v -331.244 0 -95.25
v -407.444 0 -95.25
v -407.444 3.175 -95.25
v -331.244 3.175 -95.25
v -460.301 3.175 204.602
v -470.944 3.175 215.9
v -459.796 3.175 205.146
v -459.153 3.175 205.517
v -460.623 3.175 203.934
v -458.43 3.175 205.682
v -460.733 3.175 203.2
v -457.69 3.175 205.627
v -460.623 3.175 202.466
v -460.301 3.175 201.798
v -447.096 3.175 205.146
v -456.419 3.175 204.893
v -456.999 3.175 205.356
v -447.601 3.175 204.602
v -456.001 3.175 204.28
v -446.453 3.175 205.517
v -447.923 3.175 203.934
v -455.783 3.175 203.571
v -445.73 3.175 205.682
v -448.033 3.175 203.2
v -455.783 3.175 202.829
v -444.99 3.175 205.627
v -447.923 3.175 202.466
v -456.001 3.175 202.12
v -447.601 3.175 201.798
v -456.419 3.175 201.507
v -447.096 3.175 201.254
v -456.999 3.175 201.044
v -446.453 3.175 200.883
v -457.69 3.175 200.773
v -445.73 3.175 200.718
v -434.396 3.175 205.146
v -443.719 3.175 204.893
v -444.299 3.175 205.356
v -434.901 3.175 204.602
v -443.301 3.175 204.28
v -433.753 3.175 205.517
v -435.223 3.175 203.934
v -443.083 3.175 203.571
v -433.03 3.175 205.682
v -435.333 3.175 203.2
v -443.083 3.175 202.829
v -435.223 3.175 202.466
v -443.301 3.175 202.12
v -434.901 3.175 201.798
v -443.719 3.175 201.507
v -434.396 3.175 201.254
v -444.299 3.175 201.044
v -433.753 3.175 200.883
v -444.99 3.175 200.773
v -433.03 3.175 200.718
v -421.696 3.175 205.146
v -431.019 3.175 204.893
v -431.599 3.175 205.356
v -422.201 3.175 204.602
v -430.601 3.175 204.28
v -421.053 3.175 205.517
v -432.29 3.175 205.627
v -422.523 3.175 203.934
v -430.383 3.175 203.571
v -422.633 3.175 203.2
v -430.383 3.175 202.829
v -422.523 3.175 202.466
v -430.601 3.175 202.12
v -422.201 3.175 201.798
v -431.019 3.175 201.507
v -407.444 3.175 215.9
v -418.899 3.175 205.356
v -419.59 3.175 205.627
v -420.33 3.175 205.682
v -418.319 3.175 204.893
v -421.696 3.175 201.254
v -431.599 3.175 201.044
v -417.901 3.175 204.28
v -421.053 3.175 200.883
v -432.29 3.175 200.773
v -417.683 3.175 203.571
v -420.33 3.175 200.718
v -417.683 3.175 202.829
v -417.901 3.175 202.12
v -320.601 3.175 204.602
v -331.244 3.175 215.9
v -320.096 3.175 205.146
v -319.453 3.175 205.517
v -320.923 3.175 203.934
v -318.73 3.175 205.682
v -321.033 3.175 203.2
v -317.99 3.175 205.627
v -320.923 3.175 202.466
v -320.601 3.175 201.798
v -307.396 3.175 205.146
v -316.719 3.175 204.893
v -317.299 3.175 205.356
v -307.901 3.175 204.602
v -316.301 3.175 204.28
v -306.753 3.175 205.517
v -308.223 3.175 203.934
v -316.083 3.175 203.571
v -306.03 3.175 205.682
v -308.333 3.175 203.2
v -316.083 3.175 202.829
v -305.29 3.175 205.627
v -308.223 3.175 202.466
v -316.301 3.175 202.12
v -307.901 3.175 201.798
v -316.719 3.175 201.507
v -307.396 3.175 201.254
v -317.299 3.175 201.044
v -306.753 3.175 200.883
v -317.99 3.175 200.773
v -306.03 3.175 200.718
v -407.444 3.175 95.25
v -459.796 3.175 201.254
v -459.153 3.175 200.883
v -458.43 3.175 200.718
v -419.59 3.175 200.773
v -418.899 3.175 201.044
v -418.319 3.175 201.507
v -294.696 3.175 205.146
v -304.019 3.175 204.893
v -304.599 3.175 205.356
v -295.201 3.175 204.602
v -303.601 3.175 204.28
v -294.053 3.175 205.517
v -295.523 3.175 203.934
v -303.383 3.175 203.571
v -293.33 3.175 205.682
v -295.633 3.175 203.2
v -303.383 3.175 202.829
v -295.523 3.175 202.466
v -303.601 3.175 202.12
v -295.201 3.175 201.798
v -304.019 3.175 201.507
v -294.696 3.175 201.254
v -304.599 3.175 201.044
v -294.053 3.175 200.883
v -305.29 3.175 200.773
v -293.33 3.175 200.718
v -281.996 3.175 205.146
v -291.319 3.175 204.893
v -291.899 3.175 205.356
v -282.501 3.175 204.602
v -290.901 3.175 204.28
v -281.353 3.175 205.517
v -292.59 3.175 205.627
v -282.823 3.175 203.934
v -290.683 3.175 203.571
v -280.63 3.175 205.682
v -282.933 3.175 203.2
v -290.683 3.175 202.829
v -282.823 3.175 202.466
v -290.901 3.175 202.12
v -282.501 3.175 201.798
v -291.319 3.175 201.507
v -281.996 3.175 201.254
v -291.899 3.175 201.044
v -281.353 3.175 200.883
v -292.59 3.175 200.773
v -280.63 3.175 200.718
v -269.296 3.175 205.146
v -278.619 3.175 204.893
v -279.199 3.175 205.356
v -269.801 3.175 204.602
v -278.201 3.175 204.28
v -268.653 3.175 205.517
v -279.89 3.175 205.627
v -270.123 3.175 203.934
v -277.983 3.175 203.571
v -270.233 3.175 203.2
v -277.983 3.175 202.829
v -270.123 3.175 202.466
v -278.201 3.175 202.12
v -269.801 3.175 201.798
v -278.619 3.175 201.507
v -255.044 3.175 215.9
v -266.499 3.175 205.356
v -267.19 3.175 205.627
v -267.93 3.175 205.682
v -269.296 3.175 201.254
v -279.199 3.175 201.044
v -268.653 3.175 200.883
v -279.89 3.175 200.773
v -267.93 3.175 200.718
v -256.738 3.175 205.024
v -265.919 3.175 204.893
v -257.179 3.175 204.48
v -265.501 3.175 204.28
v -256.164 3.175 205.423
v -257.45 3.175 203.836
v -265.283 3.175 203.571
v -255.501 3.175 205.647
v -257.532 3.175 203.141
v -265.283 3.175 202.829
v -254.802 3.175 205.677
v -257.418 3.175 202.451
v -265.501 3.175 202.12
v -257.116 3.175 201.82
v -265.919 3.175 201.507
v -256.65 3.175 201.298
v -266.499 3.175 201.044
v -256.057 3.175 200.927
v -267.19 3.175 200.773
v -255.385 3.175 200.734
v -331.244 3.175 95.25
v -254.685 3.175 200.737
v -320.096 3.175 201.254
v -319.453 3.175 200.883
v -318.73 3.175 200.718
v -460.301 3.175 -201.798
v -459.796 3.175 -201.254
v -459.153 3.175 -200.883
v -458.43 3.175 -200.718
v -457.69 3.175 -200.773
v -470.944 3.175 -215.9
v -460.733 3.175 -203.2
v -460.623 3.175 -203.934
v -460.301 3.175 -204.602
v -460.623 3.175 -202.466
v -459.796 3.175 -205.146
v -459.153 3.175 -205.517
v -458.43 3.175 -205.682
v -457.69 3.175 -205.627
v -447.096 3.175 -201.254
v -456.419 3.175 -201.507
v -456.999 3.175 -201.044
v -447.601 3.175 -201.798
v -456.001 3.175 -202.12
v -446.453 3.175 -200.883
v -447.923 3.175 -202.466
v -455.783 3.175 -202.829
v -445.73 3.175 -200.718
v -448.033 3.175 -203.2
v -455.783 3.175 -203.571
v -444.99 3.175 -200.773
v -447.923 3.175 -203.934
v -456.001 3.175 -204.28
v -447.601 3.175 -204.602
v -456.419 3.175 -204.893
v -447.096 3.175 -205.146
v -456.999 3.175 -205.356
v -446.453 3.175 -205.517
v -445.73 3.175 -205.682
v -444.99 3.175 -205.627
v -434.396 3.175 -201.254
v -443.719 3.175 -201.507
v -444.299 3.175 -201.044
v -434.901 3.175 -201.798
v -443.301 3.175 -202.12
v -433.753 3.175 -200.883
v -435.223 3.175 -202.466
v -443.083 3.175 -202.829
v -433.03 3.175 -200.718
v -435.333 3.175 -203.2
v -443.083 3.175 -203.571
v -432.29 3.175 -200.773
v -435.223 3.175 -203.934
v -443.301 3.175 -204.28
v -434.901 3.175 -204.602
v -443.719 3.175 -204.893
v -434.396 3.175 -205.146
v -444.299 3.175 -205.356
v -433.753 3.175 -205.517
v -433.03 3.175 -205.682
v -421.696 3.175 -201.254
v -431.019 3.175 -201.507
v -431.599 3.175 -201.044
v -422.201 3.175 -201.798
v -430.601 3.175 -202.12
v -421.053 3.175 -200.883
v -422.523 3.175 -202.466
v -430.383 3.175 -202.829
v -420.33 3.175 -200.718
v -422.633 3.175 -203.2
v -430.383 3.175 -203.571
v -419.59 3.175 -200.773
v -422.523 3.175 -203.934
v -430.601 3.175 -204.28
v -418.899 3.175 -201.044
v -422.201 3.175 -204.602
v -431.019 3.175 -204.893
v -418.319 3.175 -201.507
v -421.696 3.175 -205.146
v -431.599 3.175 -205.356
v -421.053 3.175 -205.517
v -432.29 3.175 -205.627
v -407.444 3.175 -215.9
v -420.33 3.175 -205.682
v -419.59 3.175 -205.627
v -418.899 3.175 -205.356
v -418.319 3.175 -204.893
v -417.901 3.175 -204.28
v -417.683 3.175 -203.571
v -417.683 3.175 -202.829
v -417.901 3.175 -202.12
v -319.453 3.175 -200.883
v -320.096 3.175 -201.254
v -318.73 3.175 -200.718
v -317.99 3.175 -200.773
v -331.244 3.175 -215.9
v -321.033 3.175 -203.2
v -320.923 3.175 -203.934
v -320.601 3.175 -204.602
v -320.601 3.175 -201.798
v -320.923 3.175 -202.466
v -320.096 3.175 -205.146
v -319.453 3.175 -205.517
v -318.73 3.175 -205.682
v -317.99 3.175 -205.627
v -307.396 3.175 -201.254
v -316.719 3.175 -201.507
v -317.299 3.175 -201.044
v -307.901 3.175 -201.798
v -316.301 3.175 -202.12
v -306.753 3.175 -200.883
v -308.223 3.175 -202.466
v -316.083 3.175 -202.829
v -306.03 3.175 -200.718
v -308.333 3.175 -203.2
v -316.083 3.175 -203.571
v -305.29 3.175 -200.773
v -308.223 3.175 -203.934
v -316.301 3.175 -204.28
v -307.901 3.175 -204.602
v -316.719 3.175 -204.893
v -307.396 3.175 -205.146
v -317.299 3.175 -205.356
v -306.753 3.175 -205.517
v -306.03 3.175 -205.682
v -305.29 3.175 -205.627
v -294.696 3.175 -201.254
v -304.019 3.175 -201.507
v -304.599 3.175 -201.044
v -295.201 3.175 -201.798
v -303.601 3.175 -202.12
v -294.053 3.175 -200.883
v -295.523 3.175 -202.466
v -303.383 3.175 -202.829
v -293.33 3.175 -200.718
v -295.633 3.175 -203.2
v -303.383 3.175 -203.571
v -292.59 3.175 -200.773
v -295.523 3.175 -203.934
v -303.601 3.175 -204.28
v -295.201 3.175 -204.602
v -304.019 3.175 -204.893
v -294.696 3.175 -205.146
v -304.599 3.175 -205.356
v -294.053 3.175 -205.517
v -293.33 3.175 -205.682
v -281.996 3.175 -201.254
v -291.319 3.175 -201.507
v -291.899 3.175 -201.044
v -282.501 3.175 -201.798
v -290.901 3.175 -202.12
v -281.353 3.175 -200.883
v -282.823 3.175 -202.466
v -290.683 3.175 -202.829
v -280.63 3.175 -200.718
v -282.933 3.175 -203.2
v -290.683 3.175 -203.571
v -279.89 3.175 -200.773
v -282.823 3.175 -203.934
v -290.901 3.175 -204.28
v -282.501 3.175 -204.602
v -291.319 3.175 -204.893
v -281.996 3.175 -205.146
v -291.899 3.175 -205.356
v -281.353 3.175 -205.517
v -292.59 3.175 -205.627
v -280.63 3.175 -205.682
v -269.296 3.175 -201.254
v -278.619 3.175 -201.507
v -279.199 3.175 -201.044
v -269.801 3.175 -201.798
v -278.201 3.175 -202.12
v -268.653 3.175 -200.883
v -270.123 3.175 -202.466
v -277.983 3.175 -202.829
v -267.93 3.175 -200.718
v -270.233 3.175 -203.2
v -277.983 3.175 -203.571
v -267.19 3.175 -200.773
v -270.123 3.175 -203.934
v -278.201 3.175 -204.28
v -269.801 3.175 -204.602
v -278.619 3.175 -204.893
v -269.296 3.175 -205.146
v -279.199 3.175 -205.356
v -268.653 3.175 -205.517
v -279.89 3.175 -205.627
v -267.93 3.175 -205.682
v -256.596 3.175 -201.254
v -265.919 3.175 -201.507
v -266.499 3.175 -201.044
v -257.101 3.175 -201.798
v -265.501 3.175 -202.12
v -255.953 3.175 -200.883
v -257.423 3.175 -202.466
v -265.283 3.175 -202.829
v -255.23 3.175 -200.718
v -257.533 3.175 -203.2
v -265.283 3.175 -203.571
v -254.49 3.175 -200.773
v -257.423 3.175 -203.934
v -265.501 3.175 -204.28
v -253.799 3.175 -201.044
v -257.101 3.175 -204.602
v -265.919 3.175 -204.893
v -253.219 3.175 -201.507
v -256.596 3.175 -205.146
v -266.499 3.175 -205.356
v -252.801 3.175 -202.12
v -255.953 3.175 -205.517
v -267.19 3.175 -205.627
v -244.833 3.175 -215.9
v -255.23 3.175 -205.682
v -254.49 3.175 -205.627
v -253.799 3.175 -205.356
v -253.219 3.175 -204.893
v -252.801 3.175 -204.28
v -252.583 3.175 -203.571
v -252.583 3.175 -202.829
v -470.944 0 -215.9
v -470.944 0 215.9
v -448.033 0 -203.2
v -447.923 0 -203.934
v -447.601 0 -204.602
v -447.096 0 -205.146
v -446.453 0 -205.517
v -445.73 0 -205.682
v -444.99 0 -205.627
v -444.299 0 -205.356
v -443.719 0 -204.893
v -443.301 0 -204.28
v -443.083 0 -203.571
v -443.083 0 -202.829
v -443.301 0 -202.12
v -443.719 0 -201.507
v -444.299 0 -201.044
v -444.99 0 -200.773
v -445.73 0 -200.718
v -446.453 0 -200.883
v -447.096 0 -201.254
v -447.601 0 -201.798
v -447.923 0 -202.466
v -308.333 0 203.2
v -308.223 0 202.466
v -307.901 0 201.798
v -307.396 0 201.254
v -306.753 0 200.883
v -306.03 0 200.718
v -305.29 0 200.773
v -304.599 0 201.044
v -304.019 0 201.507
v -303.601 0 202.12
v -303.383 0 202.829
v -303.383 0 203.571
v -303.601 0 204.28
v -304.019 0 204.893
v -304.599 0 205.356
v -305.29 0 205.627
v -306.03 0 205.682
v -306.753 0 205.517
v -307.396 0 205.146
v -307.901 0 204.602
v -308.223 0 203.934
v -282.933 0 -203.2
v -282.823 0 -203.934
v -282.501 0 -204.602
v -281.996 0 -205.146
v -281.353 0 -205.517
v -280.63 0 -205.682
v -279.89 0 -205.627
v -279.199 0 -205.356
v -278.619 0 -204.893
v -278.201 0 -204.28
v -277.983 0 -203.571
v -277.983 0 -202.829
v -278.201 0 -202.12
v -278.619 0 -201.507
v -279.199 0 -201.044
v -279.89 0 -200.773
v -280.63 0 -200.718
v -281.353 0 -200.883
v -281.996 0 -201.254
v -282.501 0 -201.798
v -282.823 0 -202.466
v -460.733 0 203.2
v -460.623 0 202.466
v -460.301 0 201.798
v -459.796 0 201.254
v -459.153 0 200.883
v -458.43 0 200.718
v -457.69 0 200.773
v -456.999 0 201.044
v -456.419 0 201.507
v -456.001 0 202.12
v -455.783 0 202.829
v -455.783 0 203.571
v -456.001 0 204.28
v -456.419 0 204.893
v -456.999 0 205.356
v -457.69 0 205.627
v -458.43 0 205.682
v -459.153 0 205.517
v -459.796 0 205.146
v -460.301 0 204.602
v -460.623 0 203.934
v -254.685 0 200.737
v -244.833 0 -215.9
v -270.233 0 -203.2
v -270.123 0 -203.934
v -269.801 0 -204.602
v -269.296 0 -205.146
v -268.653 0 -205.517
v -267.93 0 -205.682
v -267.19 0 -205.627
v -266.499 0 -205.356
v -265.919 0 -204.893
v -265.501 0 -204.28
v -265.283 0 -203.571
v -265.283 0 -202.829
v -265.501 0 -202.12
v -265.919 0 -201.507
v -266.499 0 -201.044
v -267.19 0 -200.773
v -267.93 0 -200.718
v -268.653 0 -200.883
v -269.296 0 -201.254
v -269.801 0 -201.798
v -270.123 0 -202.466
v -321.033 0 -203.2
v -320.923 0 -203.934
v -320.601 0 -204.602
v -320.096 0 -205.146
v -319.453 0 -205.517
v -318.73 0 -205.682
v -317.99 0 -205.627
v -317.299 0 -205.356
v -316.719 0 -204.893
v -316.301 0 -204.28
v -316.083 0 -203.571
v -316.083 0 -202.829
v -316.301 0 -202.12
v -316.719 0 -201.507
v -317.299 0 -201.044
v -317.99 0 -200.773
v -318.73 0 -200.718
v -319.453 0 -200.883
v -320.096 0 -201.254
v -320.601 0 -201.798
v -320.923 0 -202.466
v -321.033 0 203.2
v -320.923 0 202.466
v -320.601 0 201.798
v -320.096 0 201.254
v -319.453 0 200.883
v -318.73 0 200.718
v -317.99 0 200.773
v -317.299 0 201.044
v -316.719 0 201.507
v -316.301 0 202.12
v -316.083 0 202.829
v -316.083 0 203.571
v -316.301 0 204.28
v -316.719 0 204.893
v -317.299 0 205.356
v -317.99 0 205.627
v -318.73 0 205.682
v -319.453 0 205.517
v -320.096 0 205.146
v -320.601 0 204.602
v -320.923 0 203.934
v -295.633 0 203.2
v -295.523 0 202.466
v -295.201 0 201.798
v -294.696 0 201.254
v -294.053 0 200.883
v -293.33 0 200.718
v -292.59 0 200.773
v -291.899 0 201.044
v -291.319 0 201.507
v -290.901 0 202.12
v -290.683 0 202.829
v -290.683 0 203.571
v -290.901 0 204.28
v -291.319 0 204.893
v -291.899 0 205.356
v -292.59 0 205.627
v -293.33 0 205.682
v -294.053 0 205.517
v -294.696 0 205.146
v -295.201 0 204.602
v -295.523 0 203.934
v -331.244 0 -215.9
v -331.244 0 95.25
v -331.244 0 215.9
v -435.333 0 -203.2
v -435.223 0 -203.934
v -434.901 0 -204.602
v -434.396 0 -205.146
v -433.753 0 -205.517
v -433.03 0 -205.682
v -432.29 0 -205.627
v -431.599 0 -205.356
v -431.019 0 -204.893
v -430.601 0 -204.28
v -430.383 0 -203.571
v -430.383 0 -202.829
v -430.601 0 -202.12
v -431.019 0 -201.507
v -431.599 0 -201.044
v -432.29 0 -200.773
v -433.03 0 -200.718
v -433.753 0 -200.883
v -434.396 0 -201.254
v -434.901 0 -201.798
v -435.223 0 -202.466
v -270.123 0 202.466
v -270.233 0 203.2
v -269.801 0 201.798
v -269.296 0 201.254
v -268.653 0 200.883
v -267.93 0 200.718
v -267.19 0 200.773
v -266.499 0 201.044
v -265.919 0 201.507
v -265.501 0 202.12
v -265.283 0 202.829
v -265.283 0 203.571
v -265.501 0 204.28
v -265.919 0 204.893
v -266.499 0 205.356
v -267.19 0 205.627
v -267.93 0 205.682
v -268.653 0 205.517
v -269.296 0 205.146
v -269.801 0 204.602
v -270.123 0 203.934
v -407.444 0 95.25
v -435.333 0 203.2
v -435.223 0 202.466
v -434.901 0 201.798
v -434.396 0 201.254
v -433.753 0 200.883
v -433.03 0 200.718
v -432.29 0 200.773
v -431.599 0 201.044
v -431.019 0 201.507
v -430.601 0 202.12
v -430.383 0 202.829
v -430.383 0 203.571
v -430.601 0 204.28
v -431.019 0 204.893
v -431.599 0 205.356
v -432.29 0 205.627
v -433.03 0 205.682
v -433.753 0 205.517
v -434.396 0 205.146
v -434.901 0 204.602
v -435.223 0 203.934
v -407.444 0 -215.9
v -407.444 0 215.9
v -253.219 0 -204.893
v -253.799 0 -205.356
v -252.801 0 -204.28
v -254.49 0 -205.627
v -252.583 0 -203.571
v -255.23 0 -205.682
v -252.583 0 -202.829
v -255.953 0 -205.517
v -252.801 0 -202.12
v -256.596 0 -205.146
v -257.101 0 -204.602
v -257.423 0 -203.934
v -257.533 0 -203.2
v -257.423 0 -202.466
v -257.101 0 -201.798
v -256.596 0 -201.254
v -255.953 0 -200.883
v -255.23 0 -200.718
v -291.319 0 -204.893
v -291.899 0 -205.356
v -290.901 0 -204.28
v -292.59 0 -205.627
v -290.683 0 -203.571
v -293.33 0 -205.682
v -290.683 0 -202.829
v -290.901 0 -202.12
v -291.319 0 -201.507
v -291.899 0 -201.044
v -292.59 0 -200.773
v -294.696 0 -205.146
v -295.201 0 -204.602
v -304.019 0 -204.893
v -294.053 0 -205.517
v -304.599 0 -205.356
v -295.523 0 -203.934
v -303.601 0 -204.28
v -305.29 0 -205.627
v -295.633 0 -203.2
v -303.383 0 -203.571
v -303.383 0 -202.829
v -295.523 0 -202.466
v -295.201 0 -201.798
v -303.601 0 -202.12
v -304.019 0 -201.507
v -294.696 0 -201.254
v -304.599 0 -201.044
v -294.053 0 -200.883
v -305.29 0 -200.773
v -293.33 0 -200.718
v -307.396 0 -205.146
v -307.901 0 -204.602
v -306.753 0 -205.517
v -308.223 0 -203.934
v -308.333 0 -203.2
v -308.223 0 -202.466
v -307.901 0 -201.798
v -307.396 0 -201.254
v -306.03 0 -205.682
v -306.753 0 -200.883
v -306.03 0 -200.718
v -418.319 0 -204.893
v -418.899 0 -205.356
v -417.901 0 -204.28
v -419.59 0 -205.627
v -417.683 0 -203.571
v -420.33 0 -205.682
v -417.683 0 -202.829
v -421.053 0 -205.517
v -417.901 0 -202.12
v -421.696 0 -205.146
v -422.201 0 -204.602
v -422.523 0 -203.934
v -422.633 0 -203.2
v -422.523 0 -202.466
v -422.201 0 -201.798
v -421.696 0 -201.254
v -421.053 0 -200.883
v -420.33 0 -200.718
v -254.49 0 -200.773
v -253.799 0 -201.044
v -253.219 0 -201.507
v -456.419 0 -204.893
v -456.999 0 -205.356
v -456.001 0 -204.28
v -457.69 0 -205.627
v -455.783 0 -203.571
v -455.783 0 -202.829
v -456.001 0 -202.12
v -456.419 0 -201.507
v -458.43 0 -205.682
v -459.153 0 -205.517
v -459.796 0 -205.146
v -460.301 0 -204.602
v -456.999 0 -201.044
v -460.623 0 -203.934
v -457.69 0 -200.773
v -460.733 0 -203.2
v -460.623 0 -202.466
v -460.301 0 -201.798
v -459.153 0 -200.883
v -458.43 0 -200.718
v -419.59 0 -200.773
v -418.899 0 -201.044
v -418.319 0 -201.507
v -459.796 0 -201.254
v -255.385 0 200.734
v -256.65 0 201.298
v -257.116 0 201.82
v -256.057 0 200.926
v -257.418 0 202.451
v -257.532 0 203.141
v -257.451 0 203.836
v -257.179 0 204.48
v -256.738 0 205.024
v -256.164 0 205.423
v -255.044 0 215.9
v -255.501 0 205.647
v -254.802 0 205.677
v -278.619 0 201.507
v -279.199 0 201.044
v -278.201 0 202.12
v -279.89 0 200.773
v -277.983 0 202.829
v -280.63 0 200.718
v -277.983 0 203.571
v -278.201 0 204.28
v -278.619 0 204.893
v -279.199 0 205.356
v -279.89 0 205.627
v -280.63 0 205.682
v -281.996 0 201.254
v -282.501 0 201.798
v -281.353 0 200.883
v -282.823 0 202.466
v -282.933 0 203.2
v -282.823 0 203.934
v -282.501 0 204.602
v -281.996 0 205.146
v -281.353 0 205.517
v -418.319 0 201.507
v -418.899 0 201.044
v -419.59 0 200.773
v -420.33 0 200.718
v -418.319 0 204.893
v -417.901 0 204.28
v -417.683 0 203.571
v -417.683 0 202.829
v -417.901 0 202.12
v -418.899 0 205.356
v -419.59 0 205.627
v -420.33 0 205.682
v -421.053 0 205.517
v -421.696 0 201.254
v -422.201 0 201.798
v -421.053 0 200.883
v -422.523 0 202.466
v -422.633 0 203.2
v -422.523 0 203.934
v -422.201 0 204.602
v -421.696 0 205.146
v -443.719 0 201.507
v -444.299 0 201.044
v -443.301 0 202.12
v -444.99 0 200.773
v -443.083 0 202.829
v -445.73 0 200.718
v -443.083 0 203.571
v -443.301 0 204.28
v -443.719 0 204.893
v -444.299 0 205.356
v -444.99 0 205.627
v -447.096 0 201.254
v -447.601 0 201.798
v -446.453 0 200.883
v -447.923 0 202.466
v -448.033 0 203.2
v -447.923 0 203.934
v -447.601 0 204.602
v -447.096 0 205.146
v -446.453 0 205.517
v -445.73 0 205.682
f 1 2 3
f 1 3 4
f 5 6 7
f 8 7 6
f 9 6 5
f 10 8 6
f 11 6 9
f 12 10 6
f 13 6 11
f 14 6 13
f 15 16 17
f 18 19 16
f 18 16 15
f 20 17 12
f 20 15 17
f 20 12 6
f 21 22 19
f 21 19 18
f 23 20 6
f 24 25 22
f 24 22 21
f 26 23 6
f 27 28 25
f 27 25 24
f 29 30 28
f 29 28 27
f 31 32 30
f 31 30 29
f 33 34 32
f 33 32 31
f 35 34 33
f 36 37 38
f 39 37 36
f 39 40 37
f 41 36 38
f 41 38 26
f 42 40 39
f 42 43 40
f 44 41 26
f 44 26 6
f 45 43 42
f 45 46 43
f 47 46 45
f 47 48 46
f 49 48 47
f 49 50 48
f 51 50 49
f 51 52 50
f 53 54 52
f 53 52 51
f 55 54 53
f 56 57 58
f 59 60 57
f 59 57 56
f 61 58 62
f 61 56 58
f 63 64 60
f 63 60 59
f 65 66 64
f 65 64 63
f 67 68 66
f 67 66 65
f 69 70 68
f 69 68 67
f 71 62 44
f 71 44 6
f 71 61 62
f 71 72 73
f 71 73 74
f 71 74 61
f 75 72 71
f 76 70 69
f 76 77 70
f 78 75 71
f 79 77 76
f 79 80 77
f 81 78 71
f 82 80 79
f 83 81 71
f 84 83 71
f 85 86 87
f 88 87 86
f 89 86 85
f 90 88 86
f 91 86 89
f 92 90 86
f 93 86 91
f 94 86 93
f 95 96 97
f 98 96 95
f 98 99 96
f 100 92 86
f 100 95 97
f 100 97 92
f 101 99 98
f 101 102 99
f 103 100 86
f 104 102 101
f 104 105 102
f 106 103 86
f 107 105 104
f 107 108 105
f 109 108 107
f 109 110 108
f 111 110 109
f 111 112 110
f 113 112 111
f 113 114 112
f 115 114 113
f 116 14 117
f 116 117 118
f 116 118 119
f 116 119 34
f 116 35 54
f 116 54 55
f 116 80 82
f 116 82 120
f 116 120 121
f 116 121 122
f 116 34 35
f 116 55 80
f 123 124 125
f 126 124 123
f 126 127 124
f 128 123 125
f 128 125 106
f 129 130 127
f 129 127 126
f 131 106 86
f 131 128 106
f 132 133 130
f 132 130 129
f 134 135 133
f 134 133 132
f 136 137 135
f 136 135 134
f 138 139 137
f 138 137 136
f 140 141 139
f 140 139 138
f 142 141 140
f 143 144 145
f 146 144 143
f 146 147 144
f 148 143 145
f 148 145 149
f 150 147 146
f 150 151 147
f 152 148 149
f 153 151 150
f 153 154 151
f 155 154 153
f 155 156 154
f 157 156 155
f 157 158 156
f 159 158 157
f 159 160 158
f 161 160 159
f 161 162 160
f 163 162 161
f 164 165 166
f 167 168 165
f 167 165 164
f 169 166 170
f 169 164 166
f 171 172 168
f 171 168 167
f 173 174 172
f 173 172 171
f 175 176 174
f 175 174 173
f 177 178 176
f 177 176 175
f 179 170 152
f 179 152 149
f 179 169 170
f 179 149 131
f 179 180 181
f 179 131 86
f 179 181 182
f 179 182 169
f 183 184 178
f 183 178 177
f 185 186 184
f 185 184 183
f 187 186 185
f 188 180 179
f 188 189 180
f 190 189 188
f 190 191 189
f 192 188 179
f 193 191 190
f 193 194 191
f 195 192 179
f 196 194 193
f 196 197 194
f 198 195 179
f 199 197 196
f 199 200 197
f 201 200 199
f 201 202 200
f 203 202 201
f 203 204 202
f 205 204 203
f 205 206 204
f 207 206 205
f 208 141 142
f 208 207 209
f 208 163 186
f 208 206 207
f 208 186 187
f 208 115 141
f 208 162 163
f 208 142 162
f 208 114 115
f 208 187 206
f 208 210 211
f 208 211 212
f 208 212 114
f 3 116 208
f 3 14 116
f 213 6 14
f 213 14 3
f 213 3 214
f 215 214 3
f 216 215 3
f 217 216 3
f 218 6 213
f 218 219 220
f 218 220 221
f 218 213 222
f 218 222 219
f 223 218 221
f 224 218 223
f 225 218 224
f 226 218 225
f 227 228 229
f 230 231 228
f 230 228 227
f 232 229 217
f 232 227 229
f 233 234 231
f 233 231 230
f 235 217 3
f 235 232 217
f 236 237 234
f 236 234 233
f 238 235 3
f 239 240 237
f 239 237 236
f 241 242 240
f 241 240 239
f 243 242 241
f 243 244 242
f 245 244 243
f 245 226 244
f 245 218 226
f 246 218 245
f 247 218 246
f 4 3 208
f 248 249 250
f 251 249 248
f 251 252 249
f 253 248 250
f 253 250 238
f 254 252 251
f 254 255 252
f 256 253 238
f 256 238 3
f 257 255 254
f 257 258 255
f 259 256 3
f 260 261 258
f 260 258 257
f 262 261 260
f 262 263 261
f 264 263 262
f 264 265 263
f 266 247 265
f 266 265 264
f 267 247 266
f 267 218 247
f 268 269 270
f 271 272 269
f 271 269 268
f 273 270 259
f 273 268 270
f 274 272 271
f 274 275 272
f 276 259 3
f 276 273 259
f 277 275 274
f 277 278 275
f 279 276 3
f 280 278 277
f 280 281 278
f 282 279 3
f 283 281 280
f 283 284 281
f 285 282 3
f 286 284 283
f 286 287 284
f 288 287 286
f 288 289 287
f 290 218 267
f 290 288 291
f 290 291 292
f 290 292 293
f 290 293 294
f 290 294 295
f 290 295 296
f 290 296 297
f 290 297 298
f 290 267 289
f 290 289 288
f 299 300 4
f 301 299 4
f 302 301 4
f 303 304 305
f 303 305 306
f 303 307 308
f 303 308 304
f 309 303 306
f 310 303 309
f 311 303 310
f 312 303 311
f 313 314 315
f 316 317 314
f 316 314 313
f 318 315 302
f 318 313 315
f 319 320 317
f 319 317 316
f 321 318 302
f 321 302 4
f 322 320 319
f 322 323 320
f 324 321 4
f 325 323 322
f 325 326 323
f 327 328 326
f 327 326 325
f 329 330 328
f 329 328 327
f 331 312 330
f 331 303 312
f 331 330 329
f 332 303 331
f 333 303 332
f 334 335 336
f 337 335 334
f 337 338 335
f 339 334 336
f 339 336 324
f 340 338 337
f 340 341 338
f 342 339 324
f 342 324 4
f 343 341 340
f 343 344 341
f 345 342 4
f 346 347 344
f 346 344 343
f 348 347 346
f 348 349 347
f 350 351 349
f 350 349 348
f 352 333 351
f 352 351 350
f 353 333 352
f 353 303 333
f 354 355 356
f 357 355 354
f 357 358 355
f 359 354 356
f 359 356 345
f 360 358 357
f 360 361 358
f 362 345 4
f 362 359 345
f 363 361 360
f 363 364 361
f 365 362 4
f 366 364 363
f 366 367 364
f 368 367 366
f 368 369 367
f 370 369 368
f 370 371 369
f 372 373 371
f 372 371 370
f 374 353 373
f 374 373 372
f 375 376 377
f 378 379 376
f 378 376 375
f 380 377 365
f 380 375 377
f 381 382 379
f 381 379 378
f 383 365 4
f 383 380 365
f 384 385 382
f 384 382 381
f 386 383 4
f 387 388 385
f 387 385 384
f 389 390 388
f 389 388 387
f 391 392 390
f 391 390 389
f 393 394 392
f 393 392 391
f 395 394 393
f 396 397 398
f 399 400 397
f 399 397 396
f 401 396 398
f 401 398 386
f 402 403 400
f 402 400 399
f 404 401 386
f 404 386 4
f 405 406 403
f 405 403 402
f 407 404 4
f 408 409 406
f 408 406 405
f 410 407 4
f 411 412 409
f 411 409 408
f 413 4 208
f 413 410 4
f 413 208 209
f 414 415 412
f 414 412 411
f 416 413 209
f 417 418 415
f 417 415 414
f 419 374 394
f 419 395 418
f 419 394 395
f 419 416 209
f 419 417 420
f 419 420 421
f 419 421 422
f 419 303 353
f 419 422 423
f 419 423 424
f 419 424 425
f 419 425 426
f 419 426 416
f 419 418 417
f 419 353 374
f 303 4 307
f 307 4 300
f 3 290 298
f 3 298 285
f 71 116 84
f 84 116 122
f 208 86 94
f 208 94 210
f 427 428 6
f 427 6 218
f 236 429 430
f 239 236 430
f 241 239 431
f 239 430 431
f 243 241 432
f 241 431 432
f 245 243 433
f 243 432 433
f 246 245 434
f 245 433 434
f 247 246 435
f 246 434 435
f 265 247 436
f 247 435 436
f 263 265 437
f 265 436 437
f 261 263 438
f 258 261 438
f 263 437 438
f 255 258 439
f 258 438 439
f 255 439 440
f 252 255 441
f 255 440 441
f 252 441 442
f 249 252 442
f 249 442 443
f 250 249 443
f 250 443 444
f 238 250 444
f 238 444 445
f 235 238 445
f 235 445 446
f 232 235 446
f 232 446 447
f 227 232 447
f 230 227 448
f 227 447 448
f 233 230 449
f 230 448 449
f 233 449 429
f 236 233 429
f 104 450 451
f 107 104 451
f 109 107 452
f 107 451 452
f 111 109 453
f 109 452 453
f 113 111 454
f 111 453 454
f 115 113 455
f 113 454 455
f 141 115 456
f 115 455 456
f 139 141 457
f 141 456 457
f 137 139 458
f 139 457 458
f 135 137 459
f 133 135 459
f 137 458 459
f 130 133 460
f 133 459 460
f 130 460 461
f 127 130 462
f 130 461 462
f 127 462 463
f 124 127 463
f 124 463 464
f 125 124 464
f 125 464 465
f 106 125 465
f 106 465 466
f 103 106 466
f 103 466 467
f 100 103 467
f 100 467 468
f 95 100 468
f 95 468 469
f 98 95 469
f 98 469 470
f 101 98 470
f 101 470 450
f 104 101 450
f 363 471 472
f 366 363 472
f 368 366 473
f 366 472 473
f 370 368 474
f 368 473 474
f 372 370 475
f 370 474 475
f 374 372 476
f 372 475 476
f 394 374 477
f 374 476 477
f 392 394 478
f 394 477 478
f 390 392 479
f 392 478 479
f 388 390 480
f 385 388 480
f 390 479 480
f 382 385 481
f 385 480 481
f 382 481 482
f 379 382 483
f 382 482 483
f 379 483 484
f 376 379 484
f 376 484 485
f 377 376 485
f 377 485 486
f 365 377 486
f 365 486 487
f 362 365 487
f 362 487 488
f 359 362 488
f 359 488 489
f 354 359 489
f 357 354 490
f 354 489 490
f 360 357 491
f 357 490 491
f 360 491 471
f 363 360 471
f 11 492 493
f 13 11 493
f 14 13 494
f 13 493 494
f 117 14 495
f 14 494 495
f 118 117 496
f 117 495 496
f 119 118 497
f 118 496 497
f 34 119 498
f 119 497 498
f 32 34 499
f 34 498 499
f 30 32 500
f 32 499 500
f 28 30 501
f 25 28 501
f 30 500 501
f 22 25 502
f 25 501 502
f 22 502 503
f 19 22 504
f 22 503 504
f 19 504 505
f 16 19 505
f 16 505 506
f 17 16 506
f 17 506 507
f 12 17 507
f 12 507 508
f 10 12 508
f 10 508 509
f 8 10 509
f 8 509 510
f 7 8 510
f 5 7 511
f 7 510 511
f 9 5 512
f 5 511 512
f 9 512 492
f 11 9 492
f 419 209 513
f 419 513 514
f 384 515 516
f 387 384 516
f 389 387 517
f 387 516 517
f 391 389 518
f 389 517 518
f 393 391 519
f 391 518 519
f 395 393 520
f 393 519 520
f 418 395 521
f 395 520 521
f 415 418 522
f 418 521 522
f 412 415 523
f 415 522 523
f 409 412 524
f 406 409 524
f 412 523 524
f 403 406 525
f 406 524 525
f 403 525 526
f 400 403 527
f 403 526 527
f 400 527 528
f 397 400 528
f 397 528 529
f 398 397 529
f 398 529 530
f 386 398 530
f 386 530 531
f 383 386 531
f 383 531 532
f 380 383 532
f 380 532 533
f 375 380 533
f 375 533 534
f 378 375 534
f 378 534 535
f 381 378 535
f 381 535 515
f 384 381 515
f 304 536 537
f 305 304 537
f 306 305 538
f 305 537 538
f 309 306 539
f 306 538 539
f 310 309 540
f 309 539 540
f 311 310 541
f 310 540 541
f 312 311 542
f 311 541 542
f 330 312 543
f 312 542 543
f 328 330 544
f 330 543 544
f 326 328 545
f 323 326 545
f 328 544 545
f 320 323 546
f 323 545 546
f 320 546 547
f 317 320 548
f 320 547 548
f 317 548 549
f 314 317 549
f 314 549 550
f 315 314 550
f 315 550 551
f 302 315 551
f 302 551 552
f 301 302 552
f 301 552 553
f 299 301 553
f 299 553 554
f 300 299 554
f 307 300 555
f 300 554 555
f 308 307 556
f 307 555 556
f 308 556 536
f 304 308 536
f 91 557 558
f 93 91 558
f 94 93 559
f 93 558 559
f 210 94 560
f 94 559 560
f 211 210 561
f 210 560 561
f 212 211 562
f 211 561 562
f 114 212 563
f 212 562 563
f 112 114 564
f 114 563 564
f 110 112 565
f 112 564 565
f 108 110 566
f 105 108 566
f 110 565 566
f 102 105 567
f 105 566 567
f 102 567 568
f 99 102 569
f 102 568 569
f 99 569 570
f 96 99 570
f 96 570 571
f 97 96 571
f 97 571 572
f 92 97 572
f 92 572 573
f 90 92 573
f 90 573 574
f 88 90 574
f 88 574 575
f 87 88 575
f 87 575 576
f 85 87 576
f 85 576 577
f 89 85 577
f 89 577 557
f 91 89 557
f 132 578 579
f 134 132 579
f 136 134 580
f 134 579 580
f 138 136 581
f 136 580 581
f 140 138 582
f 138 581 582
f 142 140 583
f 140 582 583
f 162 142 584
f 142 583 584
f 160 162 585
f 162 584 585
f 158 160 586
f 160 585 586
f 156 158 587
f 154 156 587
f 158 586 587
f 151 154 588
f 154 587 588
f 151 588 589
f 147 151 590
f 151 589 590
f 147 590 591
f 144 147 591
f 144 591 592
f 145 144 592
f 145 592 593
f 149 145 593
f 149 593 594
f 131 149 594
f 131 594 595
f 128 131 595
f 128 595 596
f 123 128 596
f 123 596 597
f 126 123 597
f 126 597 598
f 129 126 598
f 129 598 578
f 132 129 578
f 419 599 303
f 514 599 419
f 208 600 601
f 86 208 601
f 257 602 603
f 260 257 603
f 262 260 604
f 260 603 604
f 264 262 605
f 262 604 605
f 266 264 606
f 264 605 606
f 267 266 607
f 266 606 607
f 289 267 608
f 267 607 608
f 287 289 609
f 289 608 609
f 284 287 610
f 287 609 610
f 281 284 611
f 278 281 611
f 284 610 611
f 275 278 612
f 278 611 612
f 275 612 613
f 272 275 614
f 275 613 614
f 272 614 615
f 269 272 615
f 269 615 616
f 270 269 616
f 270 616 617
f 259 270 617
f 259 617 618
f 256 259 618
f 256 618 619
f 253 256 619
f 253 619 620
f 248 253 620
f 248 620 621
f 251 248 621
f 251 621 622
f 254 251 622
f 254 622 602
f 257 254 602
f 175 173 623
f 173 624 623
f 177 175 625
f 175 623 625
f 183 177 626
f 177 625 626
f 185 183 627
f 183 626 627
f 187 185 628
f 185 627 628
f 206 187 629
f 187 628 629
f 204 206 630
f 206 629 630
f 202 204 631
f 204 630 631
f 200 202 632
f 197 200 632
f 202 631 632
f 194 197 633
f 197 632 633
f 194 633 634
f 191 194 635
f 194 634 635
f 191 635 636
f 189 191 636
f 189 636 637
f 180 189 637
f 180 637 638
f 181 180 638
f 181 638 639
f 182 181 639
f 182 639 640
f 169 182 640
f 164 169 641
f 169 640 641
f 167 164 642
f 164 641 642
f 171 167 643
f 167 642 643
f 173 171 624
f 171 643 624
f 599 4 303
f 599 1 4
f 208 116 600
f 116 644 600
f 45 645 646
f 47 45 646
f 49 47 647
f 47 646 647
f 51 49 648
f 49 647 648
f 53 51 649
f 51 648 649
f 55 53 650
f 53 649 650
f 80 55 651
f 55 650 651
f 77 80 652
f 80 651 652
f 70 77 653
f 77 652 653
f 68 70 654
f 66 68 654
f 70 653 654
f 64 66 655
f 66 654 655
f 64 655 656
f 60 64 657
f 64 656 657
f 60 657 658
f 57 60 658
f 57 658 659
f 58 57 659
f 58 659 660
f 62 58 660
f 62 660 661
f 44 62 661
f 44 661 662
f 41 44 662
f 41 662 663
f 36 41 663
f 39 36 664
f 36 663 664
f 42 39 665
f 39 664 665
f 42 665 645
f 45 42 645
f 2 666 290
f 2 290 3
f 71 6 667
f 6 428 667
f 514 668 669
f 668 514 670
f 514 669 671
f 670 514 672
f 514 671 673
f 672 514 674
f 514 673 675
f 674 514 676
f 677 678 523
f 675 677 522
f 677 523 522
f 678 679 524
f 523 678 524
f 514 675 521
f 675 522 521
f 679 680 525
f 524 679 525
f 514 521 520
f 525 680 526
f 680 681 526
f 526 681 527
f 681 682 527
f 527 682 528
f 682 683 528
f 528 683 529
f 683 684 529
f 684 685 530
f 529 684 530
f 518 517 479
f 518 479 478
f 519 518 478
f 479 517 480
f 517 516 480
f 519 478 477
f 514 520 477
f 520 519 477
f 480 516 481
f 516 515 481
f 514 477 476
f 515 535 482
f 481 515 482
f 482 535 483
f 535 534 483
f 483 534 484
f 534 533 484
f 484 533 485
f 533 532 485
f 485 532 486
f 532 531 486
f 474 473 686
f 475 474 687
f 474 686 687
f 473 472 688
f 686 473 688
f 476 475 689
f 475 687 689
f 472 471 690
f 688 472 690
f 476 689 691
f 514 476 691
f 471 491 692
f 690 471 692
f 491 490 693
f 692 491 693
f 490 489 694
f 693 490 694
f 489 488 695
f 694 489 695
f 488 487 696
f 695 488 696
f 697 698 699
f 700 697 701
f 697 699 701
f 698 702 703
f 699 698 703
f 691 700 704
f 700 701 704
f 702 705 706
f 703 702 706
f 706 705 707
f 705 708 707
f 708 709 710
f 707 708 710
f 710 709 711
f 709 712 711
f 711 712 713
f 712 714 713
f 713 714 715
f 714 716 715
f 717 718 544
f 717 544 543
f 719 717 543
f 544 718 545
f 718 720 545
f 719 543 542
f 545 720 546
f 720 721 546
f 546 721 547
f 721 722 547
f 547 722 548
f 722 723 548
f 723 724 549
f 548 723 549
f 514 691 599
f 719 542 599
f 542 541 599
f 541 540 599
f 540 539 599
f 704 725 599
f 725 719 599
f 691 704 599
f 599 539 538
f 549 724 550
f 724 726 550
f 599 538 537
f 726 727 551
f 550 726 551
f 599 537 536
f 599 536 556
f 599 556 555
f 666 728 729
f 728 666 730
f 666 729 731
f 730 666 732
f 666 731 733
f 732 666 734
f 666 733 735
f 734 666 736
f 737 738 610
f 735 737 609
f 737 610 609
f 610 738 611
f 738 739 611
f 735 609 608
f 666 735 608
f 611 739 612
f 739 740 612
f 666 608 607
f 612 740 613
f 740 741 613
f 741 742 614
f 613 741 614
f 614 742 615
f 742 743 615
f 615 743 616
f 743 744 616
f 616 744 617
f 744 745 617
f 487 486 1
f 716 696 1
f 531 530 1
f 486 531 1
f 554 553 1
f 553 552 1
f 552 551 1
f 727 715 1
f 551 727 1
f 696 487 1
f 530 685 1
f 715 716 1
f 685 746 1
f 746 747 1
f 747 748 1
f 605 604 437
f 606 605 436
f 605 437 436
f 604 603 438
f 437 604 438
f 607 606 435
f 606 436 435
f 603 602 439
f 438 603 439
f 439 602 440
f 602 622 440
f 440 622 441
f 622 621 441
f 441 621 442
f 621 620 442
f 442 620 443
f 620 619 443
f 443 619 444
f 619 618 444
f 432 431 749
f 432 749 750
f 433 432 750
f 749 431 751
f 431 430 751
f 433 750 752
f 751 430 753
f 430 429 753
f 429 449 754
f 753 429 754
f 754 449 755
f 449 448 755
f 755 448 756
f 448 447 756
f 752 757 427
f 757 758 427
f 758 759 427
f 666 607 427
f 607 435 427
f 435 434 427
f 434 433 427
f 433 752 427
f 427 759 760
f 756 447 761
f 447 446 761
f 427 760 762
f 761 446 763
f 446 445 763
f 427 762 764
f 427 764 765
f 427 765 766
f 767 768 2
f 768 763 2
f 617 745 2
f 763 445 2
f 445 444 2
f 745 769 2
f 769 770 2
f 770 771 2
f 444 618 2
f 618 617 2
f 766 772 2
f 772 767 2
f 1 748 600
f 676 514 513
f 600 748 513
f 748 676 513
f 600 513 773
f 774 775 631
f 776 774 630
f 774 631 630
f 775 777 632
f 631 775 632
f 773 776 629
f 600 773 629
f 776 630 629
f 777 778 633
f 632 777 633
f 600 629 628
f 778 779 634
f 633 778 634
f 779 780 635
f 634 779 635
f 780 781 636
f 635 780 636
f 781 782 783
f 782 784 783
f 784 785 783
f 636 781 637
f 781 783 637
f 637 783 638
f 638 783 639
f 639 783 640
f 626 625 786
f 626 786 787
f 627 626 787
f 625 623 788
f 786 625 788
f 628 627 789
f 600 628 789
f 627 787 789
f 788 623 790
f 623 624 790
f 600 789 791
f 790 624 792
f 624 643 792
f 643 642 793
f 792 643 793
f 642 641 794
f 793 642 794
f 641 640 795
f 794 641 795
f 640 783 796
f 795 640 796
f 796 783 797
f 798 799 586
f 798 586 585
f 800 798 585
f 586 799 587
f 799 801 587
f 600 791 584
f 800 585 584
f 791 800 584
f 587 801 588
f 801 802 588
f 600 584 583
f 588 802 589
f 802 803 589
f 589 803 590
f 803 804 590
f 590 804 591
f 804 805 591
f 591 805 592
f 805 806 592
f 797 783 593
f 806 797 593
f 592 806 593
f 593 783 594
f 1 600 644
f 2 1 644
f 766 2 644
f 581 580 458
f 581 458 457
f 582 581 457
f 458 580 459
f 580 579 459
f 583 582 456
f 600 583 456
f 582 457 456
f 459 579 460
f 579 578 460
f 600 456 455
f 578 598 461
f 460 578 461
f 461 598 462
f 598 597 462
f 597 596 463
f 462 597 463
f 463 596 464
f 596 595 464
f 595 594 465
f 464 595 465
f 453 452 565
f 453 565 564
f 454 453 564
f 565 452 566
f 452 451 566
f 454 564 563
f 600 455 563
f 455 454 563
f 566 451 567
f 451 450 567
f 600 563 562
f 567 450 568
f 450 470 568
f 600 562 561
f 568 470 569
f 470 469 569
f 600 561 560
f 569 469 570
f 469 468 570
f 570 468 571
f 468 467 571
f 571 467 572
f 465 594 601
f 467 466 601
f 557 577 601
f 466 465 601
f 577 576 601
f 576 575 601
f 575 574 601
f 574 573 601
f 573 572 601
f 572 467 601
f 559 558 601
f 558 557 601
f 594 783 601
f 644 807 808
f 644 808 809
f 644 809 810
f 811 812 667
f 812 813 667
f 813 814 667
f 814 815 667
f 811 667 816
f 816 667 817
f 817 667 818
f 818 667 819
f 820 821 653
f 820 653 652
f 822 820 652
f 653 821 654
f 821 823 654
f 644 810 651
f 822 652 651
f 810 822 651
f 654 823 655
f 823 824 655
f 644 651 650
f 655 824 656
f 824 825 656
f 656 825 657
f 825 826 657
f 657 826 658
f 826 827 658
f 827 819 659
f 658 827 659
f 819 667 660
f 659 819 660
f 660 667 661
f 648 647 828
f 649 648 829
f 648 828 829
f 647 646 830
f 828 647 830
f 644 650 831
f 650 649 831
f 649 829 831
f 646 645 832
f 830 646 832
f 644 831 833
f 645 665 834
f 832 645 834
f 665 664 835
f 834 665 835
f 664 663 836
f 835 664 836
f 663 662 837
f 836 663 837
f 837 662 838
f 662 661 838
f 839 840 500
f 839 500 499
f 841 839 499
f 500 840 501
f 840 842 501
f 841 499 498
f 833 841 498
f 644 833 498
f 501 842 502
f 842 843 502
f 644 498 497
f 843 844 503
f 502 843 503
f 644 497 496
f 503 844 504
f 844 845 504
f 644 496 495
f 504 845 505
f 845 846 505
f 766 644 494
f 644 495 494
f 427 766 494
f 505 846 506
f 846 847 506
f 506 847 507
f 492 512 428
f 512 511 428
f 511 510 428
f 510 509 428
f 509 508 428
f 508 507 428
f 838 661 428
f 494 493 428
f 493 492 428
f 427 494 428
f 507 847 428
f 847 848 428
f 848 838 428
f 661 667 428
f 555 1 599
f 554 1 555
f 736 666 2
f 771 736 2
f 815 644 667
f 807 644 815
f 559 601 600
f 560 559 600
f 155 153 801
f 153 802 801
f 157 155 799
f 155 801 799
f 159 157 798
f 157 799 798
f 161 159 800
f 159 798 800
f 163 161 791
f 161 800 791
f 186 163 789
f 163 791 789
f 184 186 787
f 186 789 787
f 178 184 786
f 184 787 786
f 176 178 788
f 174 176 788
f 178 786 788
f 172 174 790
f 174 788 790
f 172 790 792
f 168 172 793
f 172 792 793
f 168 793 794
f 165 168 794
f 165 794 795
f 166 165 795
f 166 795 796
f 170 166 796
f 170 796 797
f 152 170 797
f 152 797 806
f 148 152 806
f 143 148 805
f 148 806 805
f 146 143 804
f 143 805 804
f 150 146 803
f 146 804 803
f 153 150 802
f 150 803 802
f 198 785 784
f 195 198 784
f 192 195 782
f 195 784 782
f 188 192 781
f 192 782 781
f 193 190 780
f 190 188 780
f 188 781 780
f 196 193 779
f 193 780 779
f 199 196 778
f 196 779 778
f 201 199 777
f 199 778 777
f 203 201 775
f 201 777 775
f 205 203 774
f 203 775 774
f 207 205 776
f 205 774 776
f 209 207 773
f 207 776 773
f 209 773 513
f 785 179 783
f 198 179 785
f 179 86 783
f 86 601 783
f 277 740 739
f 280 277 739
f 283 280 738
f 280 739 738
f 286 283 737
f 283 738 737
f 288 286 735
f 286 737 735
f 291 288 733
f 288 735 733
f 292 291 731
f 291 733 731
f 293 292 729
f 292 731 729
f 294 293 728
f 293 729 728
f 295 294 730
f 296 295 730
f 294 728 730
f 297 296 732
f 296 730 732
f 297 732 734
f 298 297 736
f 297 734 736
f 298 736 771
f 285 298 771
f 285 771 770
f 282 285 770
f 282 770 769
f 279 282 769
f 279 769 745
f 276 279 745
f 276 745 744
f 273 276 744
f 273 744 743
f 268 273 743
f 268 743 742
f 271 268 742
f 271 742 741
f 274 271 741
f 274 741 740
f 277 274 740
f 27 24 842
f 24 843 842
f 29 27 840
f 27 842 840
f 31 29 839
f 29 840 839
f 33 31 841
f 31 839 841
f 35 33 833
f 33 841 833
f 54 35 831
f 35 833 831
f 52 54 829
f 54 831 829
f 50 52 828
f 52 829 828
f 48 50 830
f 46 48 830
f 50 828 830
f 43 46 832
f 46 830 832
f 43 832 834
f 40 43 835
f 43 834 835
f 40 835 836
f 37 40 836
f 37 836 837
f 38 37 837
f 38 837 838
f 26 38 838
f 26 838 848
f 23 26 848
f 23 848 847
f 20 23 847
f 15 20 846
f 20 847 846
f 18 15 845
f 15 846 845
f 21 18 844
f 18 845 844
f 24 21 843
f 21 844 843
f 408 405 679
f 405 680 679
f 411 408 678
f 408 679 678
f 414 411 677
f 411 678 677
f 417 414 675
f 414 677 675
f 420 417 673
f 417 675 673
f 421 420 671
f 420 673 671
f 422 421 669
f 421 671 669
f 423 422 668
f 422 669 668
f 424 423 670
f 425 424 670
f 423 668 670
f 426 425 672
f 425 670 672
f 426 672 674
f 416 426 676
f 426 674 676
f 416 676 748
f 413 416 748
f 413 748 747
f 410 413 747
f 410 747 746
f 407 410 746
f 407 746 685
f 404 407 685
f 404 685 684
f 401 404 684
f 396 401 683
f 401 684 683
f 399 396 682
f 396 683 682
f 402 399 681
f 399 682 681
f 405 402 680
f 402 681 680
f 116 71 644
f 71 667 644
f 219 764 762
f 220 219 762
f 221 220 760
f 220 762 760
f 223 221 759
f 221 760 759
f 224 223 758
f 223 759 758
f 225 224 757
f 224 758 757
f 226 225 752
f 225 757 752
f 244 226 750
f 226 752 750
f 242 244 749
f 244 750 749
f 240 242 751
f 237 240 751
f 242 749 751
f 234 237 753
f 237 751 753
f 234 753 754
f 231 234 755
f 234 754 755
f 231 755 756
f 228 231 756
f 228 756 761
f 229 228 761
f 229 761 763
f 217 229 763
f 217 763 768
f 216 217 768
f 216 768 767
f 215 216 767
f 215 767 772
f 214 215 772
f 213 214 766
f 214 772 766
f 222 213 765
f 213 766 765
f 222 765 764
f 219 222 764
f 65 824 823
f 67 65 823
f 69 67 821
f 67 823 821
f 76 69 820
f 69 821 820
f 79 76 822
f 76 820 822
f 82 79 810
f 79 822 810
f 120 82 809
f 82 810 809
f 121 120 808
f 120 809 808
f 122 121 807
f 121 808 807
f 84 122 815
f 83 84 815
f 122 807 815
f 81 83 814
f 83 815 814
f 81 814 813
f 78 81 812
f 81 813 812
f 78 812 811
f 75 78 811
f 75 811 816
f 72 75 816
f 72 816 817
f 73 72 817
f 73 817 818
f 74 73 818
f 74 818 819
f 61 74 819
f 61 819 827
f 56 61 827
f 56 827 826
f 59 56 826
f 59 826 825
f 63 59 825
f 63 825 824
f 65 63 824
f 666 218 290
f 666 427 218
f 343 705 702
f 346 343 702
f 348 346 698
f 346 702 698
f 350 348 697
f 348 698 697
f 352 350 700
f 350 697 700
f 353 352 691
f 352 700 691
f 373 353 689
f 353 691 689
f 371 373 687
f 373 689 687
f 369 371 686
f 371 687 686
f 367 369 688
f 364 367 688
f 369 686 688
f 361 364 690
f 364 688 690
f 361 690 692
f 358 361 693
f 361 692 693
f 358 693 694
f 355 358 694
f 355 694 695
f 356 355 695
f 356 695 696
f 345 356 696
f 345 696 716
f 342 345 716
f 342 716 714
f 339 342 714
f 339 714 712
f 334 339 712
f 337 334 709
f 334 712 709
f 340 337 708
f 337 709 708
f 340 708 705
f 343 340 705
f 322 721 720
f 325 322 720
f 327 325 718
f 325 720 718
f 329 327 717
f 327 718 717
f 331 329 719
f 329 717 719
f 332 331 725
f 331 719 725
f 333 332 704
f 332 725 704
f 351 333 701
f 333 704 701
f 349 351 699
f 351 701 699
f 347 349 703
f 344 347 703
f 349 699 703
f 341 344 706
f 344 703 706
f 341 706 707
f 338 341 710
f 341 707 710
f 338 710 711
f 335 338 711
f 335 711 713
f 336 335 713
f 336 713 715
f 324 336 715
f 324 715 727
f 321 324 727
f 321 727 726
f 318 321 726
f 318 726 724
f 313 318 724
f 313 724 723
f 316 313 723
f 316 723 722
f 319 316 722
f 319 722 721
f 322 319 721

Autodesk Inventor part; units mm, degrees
ref_plane "YZ Plane" through (0, 0, 0) normal (1, 0, 0) x (0, 1, 0)
ref_plane "XZ Plane" through (0, 0, 0) normal (0, 1, 0) x (-1, 0, 0)
ref_plane "XY Plane" through (0, 0, 0) normal (0, 0, 1) x (1, 0, 0)
sketch "Sketch1" plane through (0, 0, 0) normal (0, 1, 0) x (-1, 0, 0)
  arc A0 (210.5939, -215.9) -> (210.5939, 215.9) centre (0, 0) ccw
  line L0 (470.9439, 215.9) -> (470.9439, -215.9)
  line L1 (470.9439, 215.9) -> (407.4439, 215.9)
  line L2 (407.4439, 215.9) -> (407.4439, 95.25)
  line L3 (407.4439, 95.25) -> (331.2439, 95.25)
  line L4 (331.2439, 95.25) -> (331.2439, 215.9)
  line L5 (470.9439, -215.9) -> (407.4439, -215.9)
  line L6 (407.4439, -215.9) -> (407.4439, -95.25)
  line L7 (407.4439, -95.25) -> (331.2439, -95.25)
  line L8 (331.2439, -95.25) -> (331.2439, -215.9)
  line L9 (331.2439, 215.9) -> (210.5939, 215.9)
  line L10 (331.2439, -215.9) -> (210.5939, -215.9)
  circle A1 centre (458.2439, 203.2) radius 2.4892
  circle A2 centre (445.5439, 203.2) radius 2.4892
  circle A3 centre (432.8439, 203.2) radius 2.4892
  circle A4 centre (420.1439, 203.2) radius 2.4892
  circle A5 centre (318.5439, 203.2) radius 2.4892
  circle A6 centre (305.8439, 203.2) radius 2.4892
  circle A7 centre (293.1439, 203.2) radius 2.4892
  circle A8 centre (280.4439, 203.2) radius 2.4892
  circle A9 centre (267.7439, 203.2) radius 2.4892
  circle A10 centre (255.0439, 203.2) radius 2.4892
  circle A11 centre (242.3439, 203.2) radius 2.4892
  circle A12 centre (229.6439, 203.2) radius 2.4892
  line L11 (597.6164, 0) -> (168.2721, 0) construction
  circle A13 centre (458.2439, -203.2) radius 2.4892
  circle A14 centre (445.5439, -203.2) radius 2.4892
  circle A15 centre (432.8439, -203.2) radius 2.4892
  circle A16 centre (420.1439, -203.2) radius 2.4892
  circle A17 centre (318.5439, -203.2) radius 2.4892
  circle A18 centre (305.8439, -203.2) radius 2.4892
  circle A19 centre (293.1439, -203.2) radius 2.4892
  circle A20 centre (280.4439, -203.2) radius 2.4892
  circle A21 centre (267.7439, -203.2) radius 2.4892
  circle A22 centre (255.0439, -203.2) radius 2.4892
  circle A23 centre (242.3439, -203.2) radius 2.4892
  circle A24 centre (229.6439, -203.2) radius 2.4892
  dimension "d0" = 603.2002
  dimension "d1" = 431.8
  dimension "d2" = 63.5
  dimension "d3" = 120.65
  dimension "d4" = 76.2
  dimension "d5" = 63.5
  dimension "d6" = 120.65
  dimension "d7" = 76.2
  dimension "d8" = 120.65
  dimension "d9" = 120.65
  dimension "d10" = 4.9784
  dimension "d11" = 12.7
  dimension "d12" = 12.7
  dimension "d15" = 12.7
  dimension "d20" = 4.9784
  dimension "d21" = 12.7
  dimension "d22" = 12.7
  dimension "d25" = 12.7
  dimension "d30" = 12.7
extrude "Extrusion1" add sketch "Sketch1" along normal blind 6.35
sketch "Sketch2" plane through (0, 6.35, 0) normal (0, 1, 0) x (1, 0, 0)
  line L0 (-407.4439, -215.9) -> (-407.4439, -95.25) projected
  line L1 (-407.4439, -95.25) -> (-331.2439, -95.25) projected
  line L2 (-331.2439, -95.25) -> (-331.2439, -215.9) projected
  line L3 (-331.2439, -215.9) -> (-210.5939, -215.9) projected
  arc A0 (-210.5939, 215.9) -> (-210.5939, -215.9) centre (0, 0) ccw projected
  line L4 (-210.5939, 215.9) -> (-331.2439, 215.9) projected
  line L5 (-331.2439, 215.9) -> (-331.2439, 95.25) projected
  line L6 (-331.2439, 95.25) -> (-407.4439, 95.25) projected
  line L7 (-407.4439, 95.25) -> (-407.4439, 215.9) projected
  line L8 (-407.4439, 215.9) -> (-470.9439, 215.9) projected
  line L9 (-470.9439, 215.9) -> (-470.9439, -215.9) projected
  line L10 (-470.9439, -215.9) -> (-407.4439, -215.9) projected
  circle A1 centre (-305.8439, 203.2) radius 2.4892 projected
  circle A2 centre (-458.2439, 203.2) radius 2.4892 projected
  circle A3 centre (-432.8439, 203.2) radius 2.4892 projected
  circle A4 centre (-420.1439, 203.2) radius 2.4892 projected
  circle A5 centre (-305.8439, -203.2) radius 2.4892 projected
  circle A6 centre (-318.5439, -203.2) radius 2.4892 projected
  circle A7 centre (-420.1439, -203.2) radius 2.4892 projected
  circle A8 centre (-432.8439, -203.2) radius 2.4892 projected
  circle A9 centre (-445.5439, -203.2) radius 2.4892 projected
  circle A10 centre (-458.2439, -203.2) radius 2.4892 projected
  circle A11 centre (-445.5439, 203.2) radius 2.4892 projected
  circle A12 centre (-318.5439, 203.2) radius 2.4892 projected
  circle A13 centre (-293.1439, 203.2) radius 2.4892 projected
  circle A14 centre (-280.4439, 203.2) radius 2.4892 projected
  circle A15 centre (-267.7439, 203.2) radius 2.4892 projected
  circle A16 centre (-255.0439, 203.2) radius 2.4892 projected
  circle A17 centre (-242.3439, 203.2) radius 2.4892 projected
  circle A18 centre (-229.6439, 203.2) radius 2.4892 projected
  circle A19 centre (-229.6439, -203.2) radius 2.4892 projected
  circle A20 centre (-242.3439, -203.2) radius 2.4892 projected
  circle A21 centre (-255.0439, -203.2) radius 2.4892 projected
  circle A22 centre (-267.7439, -203.2) radius 2.4892 projected
  circle A23 centre (-280.4439, -203.2) radius 2.4892 projected
  circle A24 centre (-293.1439, -203.2) radius 2.4892 projected
  line L11 (-470.9439, -215.9) -> (-255.0439, -215.9)
  line L12 (-255.0439, -215.9) -> (-244.8331, 215.9)
  point P0 (-253.7918, -162.9489)
  point P1 (-245.8059, 174.7629)
  dimension "d33" = 215.9
extrude "Extrusion2" add sketch "Sketch2" against normal up to surface (6.35 mm away) contours A0 L12
extrude "Extrusion3" cut sketch "Sketch2" against normal blind 25.4 contours L12 A21 A0 L3 | L12 A21 | L12 L4 A0 picked at (-254.0374, -203.0094)
sketch "Sketch3" plane through (0, 6.35, 0) normal (0, 1, 0) x (1, 0, 0)
  line L0 (-254.6854, -200.7368) -> (-244.8331, 215.9) projected
  line L1 (-244.8331, 215.9) -> (-331.2439, 215.9) projected
  line L2 (-331.2439, 215.9) -> (-331.2439, 95.25) projected
  line L3 (-331.2439, 95.25) -> (-407.4439, 95.25) projected
  line L4 (-407.4439, 95.25) -> (-407.4439, 215.9) projected
  line L5 (-407.4439, 215.9) -> (-470.9439, 215.9) projected
  line L6 (-470.9439, 215.9) -> (-470.9439, -215.9) projected
  line L7 (-470.9439, -215.9) -> (-407.4439, -215.9) projected
  line L8 (-407.4439, -215.9) -> (-407.4439, -95.25) projected
  line L9 (-407.4439, -95.25) -> (-331.2439, -95.25) projected
  line L10 (-331.2439, -95.25) -> (-331.2439, -215.9) projected
  line L11 (-331.2439, -215.9) -> (-255.0439, -215.9) projected
  line L12 (-255.0439, -215.9) -> (-254.8022, -205.6774) projected
  arc A0 (-254.6854, -200.7368) -> (-254.8022, -205.6774) centre (-255.0439, -203.2) ccw projected
  circle A1 centre (-305.8439, 203.2) radius 2.4892 projected
  circle A2 centre (-458.2439, 203.2) radius 2.4892 projected
  circle A3 centre (-432.8439, 203.2) radius 2.4892 projected
  circle A4 centre (-420.1439, 203.2) radius 2.4892 projected
  circle A5 centre (-305.8439, -203.2) radius 2.4892 projected
  circle A6 centre (-318.5439, -203.2) radius 2.4892 projected
  circle A7 centre (-420.1439, -203.2) radius 2.4892 projected
  circle A8 centre (-432.8439, -203.2) radius 2.4892 projected
  circle A9 centre (-445.5439, -203.2) radius 2.4892 projected
  circle A10 centre (-458.2439, -203.2) radius 2.4892 projected
  circle A11 centre (-445.5439, 203.2) radius 2.4892 projected
  circle A12 centre (-318.5439, 203.2) radius 2.4892 projected
  circle A13 centre (-293.1439, 203.2) radius 2.4892 projected
  circle A14 centre (-280.4439, 203.2) radius 2.4892 projected
  circle A15 centre (-267.7439, 203.2) radius 2.4892 projected
  circle A16 centre (-255.0439, 203.2) radius 2.4892 projected
  circle A17 centre (-267.7439, -203.2) radius 2.4892 projected
  circle A18 centre (-280.4439, -203.2) radius 2.4892 projected
  circle A19 centre (-293.1439, -203.2) radius 2.4892 projected
  point P0 (0, 0)
extrude "Extrusion4" cut sketch "Sketch3" against normal blind 3.175
properties part number "Polycarbonate-Note-Intakaur-Cover" material "Polycarbonate, Smoke"
